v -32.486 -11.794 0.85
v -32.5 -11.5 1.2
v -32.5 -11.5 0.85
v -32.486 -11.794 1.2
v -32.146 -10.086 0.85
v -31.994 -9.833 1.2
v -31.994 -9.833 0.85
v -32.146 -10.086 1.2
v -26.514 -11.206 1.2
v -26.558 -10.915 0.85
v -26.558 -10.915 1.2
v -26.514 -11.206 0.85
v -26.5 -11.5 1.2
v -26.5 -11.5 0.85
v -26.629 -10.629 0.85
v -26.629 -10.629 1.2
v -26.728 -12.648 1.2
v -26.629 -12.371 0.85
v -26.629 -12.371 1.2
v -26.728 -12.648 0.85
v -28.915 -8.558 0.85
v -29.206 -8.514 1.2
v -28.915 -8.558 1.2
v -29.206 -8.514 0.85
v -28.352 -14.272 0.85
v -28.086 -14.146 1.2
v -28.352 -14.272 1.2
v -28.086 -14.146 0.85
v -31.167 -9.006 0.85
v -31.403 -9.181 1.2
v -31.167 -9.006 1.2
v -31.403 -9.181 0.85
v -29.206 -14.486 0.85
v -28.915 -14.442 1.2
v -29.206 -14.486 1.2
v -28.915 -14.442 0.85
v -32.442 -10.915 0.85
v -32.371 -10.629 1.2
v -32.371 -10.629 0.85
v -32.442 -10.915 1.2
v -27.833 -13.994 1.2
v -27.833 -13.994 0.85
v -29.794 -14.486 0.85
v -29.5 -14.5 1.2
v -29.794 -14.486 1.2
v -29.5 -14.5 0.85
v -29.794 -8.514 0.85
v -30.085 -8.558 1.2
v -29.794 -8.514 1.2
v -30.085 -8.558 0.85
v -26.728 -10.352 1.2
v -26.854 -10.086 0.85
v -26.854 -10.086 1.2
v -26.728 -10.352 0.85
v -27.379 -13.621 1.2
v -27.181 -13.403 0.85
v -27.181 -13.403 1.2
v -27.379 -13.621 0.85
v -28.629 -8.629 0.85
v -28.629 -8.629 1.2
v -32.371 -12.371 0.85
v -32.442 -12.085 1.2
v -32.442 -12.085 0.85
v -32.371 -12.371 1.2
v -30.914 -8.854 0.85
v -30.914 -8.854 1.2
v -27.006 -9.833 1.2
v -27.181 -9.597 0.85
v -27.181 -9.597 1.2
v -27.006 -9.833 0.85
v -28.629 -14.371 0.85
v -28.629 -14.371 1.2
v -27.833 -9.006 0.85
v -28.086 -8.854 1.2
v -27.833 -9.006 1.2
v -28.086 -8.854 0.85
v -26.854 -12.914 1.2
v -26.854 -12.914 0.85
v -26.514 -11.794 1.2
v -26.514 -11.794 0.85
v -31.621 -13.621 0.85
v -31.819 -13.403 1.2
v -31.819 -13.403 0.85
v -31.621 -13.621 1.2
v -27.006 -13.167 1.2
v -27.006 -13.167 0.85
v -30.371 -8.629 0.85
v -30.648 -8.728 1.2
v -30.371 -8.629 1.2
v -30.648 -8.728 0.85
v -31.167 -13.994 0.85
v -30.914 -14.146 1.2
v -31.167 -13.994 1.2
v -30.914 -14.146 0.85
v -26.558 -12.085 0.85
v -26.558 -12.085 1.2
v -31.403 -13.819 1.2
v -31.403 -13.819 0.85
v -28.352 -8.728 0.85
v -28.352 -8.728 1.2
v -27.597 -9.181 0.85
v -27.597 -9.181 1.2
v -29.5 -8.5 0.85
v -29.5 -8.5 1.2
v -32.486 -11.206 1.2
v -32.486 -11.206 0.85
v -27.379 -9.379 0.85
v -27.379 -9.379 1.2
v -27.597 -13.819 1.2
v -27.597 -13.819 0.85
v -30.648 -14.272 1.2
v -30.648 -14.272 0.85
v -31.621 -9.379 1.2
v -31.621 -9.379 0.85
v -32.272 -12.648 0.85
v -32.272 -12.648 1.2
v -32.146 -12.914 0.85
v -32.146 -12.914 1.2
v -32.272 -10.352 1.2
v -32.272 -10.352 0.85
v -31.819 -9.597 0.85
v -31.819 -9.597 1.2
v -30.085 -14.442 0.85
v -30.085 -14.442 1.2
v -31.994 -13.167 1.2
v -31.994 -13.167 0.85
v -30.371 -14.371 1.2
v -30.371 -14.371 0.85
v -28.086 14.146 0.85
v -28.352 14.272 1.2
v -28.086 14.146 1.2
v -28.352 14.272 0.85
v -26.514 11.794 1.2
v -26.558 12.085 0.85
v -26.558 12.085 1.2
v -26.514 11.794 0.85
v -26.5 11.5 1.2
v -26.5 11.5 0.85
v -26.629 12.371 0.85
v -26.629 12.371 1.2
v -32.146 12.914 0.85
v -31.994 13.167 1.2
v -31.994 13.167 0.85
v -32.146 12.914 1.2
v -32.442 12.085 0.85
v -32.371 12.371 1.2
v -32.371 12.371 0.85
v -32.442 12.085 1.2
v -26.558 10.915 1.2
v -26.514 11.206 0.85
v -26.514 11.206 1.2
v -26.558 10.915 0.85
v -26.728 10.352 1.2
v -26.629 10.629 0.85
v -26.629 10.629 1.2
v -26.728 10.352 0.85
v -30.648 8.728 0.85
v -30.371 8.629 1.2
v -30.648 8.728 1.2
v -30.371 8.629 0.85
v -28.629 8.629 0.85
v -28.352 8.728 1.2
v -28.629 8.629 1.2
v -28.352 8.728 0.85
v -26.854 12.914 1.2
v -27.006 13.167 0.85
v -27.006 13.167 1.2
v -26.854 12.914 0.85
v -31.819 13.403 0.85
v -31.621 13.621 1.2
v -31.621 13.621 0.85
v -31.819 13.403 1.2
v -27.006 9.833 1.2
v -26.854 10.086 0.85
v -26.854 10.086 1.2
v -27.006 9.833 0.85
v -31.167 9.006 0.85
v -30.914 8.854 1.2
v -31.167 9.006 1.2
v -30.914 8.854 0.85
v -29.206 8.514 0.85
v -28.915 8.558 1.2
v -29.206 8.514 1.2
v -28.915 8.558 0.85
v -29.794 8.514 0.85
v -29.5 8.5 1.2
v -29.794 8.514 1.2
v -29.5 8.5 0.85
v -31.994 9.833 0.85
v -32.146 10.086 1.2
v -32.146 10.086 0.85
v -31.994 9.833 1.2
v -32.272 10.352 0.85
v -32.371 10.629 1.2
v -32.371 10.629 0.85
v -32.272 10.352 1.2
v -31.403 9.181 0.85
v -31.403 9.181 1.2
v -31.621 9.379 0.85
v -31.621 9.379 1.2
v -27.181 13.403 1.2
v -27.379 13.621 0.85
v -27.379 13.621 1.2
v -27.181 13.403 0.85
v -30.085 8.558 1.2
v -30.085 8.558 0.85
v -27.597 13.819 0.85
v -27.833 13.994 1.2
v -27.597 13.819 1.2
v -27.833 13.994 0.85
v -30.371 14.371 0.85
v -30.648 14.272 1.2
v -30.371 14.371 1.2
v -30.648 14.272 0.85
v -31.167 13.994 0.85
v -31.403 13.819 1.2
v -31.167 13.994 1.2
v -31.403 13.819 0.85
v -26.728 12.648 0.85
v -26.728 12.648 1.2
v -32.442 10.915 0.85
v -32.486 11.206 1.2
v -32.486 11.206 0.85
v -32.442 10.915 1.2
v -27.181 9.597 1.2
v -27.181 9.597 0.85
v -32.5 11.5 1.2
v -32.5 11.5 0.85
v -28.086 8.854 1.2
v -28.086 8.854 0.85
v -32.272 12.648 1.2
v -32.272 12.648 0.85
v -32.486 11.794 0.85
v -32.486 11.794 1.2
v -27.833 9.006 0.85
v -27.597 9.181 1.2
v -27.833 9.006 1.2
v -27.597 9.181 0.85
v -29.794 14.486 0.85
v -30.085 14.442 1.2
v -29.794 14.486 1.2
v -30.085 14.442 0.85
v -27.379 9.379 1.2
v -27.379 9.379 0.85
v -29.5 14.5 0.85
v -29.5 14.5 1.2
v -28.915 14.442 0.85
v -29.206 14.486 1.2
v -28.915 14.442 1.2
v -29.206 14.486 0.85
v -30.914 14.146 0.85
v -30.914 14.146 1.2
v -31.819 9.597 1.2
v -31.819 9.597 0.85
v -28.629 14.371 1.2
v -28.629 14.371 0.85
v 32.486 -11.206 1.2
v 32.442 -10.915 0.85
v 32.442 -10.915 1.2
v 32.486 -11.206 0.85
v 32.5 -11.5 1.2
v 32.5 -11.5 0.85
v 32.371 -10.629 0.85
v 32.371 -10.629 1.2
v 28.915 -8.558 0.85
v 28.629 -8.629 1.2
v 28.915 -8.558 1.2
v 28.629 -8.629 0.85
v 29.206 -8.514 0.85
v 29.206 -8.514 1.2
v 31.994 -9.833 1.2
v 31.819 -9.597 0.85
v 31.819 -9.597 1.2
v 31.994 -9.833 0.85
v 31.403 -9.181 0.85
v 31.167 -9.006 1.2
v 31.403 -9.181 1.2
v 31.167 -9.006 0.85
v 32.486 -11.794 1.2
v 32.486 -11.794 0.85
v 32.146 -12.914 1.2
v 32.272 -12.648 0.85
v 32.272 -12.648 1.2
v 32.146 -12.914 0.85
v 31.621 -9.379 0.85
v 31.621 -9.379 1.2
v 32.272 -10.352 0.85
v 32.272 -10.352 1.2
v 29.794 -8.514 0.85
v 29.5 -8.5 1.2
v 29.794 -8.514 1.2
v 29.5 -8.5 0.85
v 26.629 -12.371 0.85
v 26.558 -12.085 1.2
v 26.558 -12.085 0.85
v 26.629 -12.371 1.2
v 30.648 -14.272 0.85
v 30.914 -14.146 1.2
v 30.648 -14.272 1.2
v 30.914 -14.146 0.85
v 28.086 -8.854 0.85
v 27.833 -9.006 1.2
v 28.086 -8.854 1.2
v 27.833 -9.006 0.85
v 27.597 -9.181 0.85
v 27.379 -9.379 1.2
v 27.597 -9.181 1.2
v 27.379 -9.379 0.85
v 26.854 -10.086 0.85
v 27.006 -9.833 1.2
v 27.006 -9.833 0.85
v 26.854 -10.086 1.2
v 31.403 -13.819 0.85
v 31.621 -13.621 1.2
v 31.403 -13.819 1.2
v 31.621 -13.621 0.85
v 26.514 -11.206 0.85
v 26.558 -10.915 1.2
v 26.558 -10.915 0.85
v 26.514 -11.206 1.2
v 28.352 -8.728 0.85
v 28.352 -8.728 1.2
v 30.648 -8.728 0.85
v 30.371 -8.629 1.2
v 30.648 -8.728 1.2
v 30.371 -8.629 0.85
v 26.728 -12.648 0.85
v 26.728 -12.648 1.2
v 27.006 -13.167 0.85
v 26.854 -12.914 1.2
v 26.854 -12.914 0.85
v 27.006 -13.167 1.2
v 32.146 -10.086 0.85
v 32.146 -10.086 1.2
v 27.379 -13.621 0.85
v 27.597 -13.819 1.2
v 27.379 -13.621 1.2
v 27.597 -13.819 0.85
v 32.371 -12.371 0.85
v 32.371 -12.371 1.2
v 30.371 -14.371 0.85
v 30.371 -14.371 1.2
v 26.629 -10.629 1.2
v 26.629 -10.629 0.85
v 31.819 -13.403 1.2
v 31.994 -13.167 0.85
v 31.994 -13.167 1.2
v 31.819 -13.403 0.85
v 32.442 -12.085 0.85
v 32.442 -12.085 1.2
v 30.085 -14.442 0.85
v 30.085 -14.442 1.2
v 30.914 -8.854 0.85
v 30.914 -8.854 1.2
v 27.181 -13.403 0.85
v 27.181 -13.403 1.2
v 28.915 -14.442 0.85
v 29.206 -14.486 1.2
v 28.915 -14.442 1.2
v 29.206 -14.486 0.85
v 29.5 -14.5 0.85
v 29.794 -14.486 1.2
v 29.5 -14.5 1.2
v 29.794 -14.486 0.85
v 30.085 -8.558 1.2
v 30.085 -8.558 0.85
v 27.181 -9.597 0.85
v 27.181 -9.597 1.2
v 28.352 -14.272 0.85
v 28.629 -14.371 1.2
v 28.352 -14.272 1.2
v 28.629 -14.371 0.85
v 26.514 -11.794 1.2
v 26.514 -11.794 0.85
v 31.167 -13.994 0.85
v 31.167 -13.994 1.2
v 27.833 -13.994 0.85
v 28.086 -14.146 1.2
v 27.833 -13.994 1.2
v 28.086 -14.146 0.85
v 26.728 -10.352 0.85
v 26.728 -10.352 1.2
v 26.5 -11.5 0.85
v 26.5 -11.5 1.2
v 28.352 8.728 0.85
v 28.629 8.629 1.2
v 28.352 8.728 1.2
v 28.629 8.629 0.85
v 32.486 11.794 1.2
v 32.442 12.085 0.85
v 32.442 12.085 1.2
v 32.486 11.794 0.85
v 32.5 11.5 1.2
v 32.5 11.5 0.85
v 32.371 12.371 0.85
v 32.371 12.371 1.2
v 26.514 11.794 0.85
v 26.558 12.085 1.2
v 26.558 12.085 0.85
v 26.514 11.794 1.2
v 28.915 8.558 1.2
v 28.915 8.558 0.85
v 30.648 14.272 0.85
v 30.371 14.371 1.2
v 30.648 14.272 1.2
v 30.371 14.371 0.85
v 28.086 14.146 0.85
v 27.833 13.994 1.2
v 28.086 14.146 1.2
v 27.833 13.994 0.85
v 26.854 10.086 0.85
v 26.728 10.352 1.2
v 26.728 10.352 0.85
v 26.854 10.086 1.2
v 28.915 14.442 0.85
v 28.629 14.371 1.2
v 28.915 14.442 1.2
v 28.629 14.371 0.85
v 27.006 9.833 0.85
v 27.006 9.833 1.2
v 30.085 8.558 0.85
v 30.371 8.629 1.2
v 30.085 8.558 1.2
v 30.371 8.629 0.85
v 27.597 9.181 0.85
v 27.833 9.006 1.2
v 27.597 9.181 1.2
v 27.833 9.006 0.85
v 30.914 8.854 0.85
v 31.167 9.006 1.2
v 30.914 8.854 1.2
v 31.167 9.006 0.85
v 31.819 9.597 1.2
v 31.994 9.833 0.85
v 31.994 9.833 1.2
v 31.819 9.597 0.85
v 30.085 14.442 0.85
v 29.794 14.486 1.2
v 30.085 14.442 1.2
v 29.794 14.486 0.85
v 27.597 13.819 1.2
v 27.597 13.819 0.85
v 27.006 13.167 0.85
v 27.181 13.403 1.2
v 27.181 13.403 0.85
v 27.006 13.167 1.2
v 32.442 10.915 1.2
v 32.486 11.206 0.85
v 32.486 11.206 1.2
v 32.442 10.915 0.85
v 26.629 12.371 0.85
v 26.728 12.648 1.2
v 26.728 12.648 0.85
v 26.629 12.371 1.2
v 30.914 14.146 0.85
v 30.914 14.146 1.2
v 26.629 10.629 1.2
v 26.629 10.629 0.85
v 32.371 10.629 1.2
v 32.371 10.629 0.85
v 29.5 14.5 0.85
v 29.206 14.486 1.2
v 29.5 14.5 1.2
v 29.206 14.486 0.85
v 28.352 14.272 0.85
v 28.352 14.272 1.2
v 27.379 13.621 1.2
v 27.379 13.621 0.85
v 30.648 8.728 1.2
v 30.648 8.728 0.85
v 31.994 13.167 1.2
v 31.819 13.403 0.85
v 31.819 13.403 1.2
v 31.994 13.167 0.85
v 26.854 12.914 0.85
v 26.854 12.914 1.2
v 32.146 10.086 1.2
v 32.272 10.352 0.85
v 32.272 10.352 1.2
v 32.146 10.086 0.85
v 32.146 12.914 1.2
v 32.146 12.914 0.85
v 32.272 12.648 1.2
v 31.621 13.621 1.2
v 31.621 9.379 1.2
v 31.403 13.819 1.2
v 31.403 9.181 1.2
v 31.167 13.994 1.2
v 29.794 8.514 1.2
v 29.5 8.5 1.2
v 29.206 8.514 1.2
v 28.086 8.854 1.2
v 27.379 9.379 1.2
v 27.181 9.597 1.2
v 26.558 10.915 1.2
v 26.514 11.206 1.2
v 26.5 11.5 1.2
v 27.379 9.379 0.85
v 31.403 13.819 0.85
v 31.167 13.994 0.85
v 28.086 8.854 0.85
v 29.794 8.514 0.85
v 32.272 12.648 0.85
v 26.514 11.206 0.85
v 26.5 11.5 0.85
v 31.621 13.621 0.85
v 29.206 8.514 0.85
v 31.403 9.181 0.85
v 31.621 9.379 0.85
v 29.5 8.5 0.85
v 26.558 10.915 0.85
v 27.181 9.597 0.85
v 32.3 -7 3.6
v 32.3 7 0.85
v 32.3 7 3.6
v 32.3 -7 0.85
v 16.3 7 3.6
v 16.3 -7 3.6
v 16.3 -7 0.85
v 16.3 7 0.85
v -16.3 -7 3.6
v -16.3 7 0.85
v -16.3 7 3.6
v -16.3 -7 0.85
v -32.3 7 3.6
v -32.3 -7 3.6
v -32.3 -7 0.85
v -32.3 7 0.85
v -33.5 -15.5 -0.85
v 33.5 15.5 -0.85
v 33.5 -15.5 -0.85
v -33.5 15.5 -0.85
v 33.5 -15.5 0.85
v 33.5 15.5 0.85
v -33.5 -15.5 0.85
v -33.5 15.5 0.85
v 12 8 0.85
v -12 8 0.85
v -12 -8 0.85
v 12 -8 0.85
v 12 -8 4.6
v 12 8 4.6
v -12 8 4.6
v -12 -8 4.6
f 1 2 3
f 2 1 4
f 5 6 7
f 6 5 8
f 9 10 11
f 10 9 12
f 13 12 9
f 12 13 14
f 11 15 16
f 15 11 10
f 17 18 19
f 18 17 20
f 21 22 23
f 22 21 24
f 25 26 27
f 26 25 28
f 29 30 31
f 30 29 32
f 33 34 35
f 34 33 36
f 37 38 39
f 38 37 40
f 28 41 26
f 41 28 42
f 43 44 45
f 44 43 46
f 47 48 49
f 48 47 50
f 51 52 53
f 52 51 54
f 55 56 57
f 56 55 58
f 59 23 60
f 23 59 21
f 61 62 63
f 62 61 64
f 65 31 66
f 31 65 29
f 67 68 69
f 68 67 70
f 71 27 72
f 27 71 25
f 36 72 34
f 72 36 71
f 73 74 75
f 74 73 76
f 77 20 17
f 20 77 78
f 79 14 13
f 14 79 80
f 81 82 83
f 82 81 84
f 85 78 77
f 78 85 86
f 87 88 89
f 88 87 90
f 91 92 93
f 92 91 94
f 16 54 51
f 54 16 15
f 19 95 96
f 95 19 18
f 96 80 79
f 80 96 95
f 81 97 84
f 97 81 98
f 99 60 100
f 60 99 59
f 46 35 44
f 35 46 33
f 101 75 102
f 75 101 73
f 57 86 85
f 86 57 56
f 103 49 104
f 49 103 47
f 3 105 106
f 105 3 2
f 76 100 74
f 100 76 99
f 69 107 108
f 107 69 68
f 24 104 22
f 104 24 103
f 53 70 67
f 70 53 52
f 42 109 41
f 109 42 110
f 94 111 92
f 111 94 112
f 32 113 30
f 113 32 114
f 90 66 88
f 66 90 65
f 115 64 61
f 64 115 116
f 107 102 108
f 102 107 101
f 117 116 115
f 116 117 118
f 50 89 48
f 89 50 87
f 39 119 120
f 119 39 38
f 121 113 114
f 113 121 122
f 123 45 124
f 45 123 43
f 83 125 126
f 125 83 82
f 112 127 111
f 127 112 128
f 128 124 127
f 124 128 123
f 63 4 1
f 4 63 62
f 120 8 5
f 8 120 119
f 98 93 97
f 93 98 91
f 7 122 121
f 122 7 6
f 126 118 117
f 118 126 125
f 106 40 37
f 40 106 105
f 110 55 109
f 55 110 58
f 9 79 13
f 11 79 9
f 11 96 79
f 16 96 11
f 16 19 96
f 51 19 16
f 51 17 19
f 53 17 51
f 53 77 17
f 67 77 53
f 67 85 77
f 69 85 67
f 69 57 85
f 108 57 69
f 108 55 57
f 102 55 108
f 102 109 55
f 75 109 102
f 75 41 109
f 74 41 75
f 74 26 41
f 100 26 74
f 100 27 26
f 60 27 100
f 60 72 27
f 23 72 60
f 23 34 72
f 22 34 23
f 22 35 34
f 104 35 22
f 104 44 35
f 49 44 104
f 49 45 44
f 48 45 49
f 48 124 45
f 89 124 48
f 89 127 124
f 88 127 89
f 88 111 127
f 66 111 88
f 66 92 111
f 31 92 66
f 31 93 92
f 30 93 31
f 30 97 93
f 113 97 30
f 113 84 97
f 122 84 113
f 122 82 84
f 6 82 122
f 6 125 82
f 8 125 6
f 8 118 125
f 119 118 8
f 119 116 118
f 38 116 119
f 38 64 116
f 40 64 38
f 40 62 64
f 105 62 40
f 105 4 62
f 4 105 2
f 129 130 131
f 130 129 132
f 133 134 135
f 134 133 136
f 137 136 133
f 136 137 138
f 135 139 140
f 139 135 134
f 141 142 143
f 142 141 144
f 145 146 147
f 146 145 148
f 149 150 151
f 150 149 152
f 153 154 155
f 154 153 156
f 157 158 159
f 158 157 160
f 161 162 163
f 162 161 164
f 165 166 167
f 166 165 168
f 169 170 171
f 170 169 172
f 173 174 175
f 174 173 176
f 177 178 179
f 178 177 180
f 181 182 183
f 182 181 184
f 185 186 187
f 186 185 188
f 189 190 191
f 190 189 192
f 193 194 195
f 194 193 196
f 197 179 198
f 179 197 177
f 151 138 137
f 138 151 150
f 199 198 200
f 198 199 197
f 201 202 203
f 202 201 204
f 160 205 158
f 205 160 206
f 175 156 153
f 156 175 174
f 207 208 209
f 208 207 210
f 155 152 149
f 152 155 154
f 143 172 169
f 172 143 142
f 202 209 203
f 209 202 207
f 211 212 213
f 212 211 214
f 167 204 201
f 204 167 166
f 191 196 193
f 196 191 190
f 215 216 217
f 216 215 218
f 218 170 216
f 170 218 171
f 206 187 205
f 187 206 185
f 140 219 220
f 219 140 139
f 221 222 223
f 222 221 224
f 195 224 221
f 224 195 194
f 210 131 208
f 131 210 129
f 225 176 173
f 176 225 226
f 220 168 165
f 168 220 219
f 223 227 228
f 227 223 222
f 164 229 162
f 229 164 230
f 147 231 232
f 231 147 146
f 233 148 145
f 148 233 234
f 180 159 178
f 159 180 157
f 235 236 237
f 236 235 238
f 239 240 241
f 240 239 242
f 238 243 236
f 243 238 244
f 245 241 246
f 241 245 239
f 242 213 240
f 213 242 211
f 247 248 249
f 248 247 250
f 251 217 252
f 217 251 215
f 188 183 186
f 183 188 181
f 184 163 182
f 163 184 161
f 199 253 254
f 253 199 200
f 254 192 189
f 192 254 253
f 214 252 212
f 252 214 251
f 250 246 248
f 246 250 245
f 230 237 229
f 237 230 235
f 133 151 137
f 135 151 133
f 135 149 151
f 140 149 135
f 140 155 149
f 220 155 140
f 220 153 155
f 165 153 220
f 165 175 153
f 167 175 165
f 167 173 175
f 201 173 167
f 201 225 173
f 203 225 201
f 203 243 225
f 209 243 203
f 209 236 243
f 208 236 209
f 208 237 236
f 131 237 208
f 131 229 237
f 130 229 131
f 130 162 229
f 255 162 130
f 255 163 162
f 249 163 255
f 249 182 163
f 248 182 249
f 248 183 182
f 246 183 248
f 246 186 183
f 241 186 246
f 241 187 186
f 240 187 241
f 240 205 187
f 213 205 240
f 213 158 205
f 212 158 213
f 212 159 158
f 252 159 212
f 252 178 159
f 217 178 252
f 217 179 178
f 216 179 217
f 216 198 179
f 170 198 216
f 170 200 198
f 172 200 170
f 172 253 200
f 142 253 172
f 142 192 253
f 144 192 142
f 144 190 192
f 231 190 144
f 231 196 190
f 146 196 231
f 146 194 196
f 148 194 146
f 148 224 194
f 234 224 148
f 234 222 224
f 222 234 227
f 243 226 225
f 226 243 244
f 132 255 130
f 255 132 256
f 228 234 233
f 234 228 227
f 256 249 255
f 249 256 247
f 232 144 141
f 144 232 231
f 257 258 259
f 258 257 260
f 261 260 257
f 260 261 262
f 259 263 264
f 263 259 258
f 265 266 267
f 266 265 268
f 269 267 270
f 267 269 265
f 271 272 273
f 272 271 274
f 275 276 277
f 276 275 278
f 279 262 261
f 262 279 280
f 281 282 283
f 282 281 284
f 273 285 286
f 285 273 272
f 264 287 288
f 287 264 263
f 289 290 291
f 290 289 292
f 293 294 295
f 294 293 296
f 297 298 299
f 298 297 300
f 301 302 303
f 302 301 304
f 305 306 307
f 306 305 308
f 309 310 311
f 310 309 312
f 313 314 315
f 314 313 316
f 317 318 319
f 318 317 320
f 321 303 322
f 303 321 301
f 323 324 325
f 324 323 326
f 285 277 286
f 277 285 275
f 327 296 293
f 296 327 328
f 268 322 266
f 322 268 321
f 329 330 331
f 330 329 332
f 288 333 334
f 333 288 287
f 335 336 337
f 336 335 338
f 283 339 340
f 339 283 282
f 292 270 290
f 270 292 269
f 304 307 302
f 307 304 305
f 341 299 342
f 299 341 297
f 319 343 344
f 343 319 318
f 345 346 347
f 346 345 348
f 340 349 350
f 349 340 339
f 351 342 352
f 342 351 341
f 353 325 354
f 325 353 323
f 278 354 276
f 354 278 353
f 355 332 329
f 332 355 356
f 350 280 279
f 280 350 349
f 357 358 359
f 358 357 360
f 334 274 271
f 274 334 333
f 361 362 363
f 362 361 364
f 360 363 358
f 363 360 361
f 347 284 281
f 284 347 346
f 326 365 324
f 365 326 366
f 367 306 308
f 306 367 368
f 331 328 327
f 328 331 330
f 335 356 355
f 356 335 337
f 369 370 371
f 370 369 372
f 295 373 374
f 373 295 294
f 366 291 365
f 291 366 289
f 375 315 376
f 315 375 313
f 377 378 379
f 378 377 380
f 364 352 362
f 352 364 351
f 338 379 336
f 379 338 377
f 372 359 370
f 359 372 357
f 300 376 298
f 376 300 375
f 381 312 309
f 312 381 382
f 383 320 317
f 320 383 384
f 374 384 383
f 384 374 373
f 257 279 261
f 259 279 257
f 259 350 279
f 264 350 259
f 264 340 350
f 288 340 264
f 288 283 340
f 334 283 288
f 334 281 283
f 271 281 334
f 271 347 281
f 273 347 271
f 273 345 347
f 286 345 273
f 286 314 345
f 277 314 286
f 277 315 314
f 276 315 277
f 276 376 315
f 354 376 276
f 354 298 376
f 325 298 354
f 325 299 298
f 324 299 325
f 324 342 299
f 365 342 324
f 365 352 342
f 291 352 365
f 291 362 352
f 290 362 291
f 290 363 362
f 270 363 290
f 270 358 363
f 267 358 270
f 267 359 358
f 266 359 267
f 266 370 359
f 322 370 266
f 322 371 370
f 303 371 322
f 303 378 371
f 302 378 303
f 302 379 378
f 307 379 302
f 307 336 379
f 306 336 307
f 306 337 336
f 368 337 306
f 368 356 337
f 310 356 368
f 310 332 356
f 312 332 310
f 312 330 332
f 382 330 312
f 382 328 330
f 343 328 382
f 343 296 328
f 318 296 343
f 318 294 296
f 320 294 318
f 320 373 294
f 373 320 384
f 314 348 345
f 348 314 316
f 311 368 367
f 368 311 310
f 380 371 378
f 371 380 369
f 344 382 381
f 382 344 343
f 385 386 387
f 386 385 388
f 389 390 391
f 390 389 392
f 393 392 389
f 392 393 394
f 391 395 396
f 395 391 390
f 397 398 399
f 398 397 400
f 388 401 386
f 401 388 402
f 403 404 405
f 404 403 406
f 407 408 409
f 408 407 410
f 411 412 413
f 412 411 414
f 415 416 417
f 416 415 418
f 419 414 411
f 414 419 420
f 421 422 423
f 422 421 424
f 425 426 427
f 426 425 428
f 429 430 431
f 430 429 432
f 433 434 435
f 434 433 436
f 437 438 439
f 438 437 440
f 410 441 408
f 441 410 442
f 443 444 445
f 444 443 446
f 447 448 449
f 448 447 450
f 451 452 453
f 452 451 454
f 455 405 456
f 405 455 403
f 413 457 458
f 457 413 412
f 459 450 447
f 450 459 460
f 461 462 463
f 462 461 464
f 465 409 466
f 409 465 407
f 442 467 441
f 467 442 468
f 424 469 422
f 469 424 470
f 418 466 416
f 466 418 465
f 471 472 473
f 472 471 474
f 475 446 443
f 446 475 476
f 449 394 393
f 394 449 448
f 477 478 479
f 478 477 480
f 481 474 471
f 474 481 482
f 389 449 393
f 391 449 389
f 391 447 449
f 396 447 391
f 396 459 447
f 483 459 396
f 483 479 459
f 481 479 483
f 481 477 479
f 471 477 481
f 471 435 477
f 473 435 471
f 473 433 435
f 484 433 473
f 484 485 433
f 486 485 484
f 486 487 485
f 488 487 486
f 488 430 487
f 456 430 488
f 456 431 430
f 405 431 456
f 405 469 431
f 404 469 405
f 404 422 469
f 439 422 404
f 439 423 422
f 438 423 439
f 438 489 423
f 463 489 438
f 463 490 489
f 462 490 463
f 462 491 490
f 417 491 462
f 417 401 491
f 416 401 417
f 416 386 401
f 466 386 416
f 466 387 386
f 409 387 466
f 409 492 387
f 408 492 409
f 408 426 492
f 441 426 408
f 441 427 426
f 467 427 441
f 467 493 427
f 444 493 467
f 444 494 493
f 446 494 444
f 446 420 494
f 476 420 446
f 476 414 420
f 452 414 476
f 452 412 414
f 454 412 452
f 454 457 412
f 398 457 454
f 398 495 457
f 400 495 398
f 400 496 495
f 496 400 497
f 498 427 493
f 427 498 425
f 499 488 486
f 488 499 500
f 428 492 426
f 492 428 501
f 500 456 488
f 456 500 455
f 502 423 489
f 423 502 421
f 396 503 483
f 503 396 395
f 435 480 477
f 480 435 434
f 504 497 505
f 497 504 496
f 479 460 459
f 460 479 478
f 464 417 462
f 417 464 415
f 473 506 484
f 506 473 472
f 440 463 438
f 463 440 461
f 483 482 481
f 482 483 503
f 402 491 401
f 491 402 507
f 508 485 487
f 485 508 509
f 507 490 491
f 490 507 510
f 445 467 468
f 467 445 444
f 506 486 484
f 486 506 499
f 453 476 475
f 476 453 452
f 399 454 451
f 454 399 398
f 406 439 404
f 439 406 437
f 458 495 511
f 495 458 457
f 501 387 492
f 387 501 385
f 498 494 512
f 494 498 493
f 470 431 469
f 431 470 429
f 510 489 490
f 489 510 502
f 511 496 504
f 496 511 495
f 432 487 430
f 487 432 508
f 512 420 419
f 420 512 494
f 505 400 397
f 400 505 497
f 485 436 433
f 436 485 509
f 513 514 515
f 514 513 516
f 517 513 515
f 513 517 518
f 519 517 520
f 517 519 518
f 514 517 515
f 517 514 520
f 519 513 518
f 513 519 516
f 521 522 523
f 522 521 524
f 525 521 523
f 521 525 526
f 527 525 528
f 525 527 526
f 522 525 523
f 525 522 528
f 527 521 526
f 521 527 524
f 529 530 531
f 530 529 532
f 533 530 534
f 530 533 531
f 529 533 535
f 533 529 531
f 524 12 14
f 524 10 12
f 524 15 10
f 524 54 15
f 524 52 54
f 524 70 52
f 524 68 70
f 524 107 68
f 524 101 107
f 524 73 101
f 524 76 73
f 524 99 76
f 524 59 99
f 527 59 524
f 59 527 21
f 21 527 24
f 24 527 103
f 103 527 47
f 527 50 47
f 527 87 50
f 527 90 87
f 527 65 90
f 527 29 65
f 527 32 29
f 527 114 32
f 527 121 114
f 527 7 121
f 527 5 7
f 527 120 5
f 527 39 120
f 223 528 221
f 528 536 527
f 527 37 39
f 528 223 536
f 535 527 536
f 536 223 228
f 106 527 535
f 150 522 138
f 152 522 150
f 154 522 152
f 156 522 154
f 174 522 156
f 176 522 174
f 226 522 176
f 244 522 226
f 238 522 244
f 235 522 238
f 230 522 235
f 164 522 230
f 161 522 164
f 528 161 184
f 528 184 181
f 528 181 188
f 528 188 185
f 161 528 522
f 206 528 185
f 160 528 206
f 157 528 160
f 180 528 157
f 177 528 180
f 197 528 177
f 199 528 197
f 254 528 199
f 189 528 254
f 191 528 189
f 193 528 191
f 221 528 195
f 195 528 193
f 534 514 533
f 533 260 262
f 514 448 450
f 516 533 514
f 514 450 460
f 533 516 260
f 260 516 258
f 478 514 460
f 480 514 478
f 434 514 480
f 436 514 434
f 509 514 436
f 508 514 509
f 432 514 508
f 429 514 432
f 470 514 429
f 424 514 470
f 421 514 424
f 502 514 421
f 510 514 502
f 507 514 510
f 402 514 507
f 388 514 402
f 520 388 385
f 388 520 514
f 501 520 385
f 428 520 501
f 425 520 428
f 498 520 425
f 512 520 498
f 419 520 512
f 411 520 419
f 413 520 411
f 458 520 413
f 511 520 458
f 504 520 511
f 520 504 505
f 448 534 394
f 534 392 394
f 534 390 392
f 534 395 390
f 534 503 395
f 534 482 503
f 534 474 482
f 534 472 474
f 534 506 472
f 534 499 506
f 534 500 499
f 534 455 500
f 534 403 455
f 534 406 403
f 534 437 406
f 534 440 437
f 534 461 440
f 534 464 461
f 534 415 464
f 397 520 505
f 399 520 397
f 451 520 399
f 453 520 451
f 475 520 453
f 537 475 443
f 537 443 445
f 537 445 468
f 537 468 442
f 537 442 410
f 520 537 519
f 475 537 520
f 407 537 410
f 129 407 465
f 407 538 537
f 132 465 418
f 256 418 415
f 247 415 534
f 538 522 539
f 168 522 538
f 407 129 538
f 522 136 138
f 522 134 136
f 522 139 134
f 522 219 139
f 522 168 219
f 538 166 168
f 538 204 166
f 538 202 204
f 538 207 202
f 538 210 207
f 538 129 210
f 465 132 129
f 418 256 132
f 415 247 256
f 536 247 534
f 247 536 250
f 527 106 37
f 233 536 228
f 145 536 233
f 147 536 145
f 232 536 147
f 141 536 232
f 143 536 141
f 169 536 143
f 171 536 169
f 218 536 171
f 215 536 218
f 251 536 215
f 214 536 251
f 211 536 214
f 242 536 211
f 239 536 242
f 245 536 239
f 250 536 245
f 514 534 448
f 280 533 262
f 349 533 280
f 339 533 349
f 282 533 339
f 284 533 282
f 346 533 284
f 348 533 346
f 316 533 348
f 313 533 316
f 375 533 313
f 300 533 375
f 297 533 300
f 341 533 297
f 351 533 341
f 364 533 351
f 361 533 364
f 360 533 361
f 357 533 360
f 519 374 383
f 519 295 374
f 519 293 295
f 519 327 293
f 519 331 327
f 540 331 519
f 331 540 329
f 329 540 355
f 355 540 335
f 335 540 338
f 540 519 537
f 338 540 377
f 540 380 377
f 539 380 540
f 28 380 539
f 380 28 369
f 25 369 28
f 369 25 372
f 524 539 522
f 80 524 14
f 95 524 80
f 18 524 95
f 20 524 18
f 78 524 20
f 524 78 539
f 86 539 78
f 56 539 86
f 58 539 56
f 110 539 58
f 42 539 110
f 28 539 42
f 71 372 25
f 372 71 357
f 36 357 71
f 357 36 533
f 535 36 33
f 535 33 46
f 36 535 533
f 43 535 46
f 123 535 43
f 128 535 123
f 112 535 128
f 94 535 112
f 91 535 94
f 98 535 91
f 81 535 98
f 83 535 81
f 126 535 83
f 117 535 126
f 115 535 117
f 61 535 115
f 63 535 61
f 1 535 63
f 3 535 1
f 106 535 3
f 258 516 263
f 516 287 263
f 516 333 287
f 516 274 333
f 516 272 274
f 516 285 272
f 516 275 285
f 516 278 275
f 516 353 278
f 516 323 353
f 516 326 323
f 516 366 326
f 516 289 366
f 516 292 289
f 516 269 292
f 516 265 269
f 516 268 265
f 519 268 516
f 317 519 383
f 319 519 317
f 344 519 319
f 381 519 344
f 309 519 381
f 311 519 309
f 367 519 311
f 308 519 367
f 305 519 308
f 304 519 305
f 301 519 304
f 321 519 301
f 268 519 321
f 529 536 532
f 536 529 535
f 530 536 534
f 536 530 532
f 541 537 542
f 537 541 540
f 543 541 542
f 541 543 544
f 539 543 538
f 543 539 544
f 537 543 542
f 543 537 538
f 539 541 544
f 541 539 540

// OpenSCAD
$fn = 64;

// Target board: 67.0mm x 31.0mm x 1.7mm (ONE connected solid)
board_L = 67.0;
board_W = 31.0;
board_T = 1.7;

// Visual/feature params
corner_chamfer = 0.6;          // small corner chamfer (visual)
hole_d = 3.2;
hole_edge_margin = 4.0;

copper_T = 0.08;               // slightly thicker so it renders reliably
silk_T  = 0.08;

boss_d = 6.0;                  // small bosses around holes to keep model one solid
boss_h = 0.6;

conn_L = 16.0;                 // connector blocks (visual)
conn_W = 14.0;
conn_H = 3.0;

comp_L = 24.0;                 // component block (visual)
comp_W = 16.0;
comp_H = 4.0;

overlap = 0.25;                // overlap to guarantee connectivity

module pcb_base_chamfered() {
    // Chamfered rectangle via 2D offset then linear_extrude
    linear_extrude(height = board_T, center = true)
        offset(delta = -corner_chamfer)
            offset(delta = corner_chamfer)
                square([board_L, board_W], center = true);
}

module hole_bosses() {
    // Add bosses (not holes) so the model remains ONE connected solid
    for (sx = [-1, 1], sy = [-1, 1]) {
        translate([sx*(board_L/2 - hole_edge_margin),
                   sy*(board_W/2 - hole_edge_margin),
                   board_T/2 + boss_h/2 - overlap])
            cylinder(h = boss_h, r = boss_d/2, center = true);
    }
}

module copper_patches() {
    // Two copper rectangles on top face, positioned to resemble reference views
    // Left patch
    translate([-board_L/2 + (board_L*0.34)/2 + hole_edge_margin*0.2,
               0,
               board_T/2 + copper_T/2 - overlap])
        cube([board_L*0.34, board_W*0.32, copper_T], center = true);

    // Right patch
    translate([ board_L/2 - (board_L*0.34)/2 - hole_edge_margin*0.2,
               0,
               board_T/2 + copper_T/2 - overlap])
        cube([board_L*0.34, board_W*0.32, copper_T], center = true);
}

module silkscreen_plate() {
    translate([0, 0, board_T/2 + silk_T/2 - overlap])
        cube([board_L - 2*hole_edge_margin,
              board_W - 2*hole_edge_margin,
              silk_T], center = true);
}

module connector_blocks() {
    // Two connector-like blocks on opposite ends, connected to top face
    translate([ board_L/2 - conn_L/2 - hole_edge_margin*0.3,
                0,
                board_T/2 + conn_H/2 - overlap])
        cube([conn_L, conn_W, conn_H], center = true);

    translate([-board_L/2 + conn_L/2 + hole_edge_margin*0.3,
                0,
                board_T/2 + conn_H/2 - overlap])
        cube([conn_L, conn_W, conn_H], center = true);
}

module component_block() {
    // Central-ish component block, connected to top face
    translate([0,
               0,
               board_T/2 + comp_H/2 - overlap])
        cube([comp_L, comp_W, comp_H], center = true);
}

union() {
    color([0.0, 0.4, 0.2]) pcb_base_chamfered();

    // Keep everything as one connected solid by overlapping into the PCB
    color([0.1, 0.2, 0.6]) hole_bosses();
    color([0.72, 0.45, 0.2]) copper_patches();
    color("White") silkscreen_plate();
    color([0.85, 0.85, 0.8]) connector_blocks();
    color([0.85, 0.85, 0.8]) component_block();
}
